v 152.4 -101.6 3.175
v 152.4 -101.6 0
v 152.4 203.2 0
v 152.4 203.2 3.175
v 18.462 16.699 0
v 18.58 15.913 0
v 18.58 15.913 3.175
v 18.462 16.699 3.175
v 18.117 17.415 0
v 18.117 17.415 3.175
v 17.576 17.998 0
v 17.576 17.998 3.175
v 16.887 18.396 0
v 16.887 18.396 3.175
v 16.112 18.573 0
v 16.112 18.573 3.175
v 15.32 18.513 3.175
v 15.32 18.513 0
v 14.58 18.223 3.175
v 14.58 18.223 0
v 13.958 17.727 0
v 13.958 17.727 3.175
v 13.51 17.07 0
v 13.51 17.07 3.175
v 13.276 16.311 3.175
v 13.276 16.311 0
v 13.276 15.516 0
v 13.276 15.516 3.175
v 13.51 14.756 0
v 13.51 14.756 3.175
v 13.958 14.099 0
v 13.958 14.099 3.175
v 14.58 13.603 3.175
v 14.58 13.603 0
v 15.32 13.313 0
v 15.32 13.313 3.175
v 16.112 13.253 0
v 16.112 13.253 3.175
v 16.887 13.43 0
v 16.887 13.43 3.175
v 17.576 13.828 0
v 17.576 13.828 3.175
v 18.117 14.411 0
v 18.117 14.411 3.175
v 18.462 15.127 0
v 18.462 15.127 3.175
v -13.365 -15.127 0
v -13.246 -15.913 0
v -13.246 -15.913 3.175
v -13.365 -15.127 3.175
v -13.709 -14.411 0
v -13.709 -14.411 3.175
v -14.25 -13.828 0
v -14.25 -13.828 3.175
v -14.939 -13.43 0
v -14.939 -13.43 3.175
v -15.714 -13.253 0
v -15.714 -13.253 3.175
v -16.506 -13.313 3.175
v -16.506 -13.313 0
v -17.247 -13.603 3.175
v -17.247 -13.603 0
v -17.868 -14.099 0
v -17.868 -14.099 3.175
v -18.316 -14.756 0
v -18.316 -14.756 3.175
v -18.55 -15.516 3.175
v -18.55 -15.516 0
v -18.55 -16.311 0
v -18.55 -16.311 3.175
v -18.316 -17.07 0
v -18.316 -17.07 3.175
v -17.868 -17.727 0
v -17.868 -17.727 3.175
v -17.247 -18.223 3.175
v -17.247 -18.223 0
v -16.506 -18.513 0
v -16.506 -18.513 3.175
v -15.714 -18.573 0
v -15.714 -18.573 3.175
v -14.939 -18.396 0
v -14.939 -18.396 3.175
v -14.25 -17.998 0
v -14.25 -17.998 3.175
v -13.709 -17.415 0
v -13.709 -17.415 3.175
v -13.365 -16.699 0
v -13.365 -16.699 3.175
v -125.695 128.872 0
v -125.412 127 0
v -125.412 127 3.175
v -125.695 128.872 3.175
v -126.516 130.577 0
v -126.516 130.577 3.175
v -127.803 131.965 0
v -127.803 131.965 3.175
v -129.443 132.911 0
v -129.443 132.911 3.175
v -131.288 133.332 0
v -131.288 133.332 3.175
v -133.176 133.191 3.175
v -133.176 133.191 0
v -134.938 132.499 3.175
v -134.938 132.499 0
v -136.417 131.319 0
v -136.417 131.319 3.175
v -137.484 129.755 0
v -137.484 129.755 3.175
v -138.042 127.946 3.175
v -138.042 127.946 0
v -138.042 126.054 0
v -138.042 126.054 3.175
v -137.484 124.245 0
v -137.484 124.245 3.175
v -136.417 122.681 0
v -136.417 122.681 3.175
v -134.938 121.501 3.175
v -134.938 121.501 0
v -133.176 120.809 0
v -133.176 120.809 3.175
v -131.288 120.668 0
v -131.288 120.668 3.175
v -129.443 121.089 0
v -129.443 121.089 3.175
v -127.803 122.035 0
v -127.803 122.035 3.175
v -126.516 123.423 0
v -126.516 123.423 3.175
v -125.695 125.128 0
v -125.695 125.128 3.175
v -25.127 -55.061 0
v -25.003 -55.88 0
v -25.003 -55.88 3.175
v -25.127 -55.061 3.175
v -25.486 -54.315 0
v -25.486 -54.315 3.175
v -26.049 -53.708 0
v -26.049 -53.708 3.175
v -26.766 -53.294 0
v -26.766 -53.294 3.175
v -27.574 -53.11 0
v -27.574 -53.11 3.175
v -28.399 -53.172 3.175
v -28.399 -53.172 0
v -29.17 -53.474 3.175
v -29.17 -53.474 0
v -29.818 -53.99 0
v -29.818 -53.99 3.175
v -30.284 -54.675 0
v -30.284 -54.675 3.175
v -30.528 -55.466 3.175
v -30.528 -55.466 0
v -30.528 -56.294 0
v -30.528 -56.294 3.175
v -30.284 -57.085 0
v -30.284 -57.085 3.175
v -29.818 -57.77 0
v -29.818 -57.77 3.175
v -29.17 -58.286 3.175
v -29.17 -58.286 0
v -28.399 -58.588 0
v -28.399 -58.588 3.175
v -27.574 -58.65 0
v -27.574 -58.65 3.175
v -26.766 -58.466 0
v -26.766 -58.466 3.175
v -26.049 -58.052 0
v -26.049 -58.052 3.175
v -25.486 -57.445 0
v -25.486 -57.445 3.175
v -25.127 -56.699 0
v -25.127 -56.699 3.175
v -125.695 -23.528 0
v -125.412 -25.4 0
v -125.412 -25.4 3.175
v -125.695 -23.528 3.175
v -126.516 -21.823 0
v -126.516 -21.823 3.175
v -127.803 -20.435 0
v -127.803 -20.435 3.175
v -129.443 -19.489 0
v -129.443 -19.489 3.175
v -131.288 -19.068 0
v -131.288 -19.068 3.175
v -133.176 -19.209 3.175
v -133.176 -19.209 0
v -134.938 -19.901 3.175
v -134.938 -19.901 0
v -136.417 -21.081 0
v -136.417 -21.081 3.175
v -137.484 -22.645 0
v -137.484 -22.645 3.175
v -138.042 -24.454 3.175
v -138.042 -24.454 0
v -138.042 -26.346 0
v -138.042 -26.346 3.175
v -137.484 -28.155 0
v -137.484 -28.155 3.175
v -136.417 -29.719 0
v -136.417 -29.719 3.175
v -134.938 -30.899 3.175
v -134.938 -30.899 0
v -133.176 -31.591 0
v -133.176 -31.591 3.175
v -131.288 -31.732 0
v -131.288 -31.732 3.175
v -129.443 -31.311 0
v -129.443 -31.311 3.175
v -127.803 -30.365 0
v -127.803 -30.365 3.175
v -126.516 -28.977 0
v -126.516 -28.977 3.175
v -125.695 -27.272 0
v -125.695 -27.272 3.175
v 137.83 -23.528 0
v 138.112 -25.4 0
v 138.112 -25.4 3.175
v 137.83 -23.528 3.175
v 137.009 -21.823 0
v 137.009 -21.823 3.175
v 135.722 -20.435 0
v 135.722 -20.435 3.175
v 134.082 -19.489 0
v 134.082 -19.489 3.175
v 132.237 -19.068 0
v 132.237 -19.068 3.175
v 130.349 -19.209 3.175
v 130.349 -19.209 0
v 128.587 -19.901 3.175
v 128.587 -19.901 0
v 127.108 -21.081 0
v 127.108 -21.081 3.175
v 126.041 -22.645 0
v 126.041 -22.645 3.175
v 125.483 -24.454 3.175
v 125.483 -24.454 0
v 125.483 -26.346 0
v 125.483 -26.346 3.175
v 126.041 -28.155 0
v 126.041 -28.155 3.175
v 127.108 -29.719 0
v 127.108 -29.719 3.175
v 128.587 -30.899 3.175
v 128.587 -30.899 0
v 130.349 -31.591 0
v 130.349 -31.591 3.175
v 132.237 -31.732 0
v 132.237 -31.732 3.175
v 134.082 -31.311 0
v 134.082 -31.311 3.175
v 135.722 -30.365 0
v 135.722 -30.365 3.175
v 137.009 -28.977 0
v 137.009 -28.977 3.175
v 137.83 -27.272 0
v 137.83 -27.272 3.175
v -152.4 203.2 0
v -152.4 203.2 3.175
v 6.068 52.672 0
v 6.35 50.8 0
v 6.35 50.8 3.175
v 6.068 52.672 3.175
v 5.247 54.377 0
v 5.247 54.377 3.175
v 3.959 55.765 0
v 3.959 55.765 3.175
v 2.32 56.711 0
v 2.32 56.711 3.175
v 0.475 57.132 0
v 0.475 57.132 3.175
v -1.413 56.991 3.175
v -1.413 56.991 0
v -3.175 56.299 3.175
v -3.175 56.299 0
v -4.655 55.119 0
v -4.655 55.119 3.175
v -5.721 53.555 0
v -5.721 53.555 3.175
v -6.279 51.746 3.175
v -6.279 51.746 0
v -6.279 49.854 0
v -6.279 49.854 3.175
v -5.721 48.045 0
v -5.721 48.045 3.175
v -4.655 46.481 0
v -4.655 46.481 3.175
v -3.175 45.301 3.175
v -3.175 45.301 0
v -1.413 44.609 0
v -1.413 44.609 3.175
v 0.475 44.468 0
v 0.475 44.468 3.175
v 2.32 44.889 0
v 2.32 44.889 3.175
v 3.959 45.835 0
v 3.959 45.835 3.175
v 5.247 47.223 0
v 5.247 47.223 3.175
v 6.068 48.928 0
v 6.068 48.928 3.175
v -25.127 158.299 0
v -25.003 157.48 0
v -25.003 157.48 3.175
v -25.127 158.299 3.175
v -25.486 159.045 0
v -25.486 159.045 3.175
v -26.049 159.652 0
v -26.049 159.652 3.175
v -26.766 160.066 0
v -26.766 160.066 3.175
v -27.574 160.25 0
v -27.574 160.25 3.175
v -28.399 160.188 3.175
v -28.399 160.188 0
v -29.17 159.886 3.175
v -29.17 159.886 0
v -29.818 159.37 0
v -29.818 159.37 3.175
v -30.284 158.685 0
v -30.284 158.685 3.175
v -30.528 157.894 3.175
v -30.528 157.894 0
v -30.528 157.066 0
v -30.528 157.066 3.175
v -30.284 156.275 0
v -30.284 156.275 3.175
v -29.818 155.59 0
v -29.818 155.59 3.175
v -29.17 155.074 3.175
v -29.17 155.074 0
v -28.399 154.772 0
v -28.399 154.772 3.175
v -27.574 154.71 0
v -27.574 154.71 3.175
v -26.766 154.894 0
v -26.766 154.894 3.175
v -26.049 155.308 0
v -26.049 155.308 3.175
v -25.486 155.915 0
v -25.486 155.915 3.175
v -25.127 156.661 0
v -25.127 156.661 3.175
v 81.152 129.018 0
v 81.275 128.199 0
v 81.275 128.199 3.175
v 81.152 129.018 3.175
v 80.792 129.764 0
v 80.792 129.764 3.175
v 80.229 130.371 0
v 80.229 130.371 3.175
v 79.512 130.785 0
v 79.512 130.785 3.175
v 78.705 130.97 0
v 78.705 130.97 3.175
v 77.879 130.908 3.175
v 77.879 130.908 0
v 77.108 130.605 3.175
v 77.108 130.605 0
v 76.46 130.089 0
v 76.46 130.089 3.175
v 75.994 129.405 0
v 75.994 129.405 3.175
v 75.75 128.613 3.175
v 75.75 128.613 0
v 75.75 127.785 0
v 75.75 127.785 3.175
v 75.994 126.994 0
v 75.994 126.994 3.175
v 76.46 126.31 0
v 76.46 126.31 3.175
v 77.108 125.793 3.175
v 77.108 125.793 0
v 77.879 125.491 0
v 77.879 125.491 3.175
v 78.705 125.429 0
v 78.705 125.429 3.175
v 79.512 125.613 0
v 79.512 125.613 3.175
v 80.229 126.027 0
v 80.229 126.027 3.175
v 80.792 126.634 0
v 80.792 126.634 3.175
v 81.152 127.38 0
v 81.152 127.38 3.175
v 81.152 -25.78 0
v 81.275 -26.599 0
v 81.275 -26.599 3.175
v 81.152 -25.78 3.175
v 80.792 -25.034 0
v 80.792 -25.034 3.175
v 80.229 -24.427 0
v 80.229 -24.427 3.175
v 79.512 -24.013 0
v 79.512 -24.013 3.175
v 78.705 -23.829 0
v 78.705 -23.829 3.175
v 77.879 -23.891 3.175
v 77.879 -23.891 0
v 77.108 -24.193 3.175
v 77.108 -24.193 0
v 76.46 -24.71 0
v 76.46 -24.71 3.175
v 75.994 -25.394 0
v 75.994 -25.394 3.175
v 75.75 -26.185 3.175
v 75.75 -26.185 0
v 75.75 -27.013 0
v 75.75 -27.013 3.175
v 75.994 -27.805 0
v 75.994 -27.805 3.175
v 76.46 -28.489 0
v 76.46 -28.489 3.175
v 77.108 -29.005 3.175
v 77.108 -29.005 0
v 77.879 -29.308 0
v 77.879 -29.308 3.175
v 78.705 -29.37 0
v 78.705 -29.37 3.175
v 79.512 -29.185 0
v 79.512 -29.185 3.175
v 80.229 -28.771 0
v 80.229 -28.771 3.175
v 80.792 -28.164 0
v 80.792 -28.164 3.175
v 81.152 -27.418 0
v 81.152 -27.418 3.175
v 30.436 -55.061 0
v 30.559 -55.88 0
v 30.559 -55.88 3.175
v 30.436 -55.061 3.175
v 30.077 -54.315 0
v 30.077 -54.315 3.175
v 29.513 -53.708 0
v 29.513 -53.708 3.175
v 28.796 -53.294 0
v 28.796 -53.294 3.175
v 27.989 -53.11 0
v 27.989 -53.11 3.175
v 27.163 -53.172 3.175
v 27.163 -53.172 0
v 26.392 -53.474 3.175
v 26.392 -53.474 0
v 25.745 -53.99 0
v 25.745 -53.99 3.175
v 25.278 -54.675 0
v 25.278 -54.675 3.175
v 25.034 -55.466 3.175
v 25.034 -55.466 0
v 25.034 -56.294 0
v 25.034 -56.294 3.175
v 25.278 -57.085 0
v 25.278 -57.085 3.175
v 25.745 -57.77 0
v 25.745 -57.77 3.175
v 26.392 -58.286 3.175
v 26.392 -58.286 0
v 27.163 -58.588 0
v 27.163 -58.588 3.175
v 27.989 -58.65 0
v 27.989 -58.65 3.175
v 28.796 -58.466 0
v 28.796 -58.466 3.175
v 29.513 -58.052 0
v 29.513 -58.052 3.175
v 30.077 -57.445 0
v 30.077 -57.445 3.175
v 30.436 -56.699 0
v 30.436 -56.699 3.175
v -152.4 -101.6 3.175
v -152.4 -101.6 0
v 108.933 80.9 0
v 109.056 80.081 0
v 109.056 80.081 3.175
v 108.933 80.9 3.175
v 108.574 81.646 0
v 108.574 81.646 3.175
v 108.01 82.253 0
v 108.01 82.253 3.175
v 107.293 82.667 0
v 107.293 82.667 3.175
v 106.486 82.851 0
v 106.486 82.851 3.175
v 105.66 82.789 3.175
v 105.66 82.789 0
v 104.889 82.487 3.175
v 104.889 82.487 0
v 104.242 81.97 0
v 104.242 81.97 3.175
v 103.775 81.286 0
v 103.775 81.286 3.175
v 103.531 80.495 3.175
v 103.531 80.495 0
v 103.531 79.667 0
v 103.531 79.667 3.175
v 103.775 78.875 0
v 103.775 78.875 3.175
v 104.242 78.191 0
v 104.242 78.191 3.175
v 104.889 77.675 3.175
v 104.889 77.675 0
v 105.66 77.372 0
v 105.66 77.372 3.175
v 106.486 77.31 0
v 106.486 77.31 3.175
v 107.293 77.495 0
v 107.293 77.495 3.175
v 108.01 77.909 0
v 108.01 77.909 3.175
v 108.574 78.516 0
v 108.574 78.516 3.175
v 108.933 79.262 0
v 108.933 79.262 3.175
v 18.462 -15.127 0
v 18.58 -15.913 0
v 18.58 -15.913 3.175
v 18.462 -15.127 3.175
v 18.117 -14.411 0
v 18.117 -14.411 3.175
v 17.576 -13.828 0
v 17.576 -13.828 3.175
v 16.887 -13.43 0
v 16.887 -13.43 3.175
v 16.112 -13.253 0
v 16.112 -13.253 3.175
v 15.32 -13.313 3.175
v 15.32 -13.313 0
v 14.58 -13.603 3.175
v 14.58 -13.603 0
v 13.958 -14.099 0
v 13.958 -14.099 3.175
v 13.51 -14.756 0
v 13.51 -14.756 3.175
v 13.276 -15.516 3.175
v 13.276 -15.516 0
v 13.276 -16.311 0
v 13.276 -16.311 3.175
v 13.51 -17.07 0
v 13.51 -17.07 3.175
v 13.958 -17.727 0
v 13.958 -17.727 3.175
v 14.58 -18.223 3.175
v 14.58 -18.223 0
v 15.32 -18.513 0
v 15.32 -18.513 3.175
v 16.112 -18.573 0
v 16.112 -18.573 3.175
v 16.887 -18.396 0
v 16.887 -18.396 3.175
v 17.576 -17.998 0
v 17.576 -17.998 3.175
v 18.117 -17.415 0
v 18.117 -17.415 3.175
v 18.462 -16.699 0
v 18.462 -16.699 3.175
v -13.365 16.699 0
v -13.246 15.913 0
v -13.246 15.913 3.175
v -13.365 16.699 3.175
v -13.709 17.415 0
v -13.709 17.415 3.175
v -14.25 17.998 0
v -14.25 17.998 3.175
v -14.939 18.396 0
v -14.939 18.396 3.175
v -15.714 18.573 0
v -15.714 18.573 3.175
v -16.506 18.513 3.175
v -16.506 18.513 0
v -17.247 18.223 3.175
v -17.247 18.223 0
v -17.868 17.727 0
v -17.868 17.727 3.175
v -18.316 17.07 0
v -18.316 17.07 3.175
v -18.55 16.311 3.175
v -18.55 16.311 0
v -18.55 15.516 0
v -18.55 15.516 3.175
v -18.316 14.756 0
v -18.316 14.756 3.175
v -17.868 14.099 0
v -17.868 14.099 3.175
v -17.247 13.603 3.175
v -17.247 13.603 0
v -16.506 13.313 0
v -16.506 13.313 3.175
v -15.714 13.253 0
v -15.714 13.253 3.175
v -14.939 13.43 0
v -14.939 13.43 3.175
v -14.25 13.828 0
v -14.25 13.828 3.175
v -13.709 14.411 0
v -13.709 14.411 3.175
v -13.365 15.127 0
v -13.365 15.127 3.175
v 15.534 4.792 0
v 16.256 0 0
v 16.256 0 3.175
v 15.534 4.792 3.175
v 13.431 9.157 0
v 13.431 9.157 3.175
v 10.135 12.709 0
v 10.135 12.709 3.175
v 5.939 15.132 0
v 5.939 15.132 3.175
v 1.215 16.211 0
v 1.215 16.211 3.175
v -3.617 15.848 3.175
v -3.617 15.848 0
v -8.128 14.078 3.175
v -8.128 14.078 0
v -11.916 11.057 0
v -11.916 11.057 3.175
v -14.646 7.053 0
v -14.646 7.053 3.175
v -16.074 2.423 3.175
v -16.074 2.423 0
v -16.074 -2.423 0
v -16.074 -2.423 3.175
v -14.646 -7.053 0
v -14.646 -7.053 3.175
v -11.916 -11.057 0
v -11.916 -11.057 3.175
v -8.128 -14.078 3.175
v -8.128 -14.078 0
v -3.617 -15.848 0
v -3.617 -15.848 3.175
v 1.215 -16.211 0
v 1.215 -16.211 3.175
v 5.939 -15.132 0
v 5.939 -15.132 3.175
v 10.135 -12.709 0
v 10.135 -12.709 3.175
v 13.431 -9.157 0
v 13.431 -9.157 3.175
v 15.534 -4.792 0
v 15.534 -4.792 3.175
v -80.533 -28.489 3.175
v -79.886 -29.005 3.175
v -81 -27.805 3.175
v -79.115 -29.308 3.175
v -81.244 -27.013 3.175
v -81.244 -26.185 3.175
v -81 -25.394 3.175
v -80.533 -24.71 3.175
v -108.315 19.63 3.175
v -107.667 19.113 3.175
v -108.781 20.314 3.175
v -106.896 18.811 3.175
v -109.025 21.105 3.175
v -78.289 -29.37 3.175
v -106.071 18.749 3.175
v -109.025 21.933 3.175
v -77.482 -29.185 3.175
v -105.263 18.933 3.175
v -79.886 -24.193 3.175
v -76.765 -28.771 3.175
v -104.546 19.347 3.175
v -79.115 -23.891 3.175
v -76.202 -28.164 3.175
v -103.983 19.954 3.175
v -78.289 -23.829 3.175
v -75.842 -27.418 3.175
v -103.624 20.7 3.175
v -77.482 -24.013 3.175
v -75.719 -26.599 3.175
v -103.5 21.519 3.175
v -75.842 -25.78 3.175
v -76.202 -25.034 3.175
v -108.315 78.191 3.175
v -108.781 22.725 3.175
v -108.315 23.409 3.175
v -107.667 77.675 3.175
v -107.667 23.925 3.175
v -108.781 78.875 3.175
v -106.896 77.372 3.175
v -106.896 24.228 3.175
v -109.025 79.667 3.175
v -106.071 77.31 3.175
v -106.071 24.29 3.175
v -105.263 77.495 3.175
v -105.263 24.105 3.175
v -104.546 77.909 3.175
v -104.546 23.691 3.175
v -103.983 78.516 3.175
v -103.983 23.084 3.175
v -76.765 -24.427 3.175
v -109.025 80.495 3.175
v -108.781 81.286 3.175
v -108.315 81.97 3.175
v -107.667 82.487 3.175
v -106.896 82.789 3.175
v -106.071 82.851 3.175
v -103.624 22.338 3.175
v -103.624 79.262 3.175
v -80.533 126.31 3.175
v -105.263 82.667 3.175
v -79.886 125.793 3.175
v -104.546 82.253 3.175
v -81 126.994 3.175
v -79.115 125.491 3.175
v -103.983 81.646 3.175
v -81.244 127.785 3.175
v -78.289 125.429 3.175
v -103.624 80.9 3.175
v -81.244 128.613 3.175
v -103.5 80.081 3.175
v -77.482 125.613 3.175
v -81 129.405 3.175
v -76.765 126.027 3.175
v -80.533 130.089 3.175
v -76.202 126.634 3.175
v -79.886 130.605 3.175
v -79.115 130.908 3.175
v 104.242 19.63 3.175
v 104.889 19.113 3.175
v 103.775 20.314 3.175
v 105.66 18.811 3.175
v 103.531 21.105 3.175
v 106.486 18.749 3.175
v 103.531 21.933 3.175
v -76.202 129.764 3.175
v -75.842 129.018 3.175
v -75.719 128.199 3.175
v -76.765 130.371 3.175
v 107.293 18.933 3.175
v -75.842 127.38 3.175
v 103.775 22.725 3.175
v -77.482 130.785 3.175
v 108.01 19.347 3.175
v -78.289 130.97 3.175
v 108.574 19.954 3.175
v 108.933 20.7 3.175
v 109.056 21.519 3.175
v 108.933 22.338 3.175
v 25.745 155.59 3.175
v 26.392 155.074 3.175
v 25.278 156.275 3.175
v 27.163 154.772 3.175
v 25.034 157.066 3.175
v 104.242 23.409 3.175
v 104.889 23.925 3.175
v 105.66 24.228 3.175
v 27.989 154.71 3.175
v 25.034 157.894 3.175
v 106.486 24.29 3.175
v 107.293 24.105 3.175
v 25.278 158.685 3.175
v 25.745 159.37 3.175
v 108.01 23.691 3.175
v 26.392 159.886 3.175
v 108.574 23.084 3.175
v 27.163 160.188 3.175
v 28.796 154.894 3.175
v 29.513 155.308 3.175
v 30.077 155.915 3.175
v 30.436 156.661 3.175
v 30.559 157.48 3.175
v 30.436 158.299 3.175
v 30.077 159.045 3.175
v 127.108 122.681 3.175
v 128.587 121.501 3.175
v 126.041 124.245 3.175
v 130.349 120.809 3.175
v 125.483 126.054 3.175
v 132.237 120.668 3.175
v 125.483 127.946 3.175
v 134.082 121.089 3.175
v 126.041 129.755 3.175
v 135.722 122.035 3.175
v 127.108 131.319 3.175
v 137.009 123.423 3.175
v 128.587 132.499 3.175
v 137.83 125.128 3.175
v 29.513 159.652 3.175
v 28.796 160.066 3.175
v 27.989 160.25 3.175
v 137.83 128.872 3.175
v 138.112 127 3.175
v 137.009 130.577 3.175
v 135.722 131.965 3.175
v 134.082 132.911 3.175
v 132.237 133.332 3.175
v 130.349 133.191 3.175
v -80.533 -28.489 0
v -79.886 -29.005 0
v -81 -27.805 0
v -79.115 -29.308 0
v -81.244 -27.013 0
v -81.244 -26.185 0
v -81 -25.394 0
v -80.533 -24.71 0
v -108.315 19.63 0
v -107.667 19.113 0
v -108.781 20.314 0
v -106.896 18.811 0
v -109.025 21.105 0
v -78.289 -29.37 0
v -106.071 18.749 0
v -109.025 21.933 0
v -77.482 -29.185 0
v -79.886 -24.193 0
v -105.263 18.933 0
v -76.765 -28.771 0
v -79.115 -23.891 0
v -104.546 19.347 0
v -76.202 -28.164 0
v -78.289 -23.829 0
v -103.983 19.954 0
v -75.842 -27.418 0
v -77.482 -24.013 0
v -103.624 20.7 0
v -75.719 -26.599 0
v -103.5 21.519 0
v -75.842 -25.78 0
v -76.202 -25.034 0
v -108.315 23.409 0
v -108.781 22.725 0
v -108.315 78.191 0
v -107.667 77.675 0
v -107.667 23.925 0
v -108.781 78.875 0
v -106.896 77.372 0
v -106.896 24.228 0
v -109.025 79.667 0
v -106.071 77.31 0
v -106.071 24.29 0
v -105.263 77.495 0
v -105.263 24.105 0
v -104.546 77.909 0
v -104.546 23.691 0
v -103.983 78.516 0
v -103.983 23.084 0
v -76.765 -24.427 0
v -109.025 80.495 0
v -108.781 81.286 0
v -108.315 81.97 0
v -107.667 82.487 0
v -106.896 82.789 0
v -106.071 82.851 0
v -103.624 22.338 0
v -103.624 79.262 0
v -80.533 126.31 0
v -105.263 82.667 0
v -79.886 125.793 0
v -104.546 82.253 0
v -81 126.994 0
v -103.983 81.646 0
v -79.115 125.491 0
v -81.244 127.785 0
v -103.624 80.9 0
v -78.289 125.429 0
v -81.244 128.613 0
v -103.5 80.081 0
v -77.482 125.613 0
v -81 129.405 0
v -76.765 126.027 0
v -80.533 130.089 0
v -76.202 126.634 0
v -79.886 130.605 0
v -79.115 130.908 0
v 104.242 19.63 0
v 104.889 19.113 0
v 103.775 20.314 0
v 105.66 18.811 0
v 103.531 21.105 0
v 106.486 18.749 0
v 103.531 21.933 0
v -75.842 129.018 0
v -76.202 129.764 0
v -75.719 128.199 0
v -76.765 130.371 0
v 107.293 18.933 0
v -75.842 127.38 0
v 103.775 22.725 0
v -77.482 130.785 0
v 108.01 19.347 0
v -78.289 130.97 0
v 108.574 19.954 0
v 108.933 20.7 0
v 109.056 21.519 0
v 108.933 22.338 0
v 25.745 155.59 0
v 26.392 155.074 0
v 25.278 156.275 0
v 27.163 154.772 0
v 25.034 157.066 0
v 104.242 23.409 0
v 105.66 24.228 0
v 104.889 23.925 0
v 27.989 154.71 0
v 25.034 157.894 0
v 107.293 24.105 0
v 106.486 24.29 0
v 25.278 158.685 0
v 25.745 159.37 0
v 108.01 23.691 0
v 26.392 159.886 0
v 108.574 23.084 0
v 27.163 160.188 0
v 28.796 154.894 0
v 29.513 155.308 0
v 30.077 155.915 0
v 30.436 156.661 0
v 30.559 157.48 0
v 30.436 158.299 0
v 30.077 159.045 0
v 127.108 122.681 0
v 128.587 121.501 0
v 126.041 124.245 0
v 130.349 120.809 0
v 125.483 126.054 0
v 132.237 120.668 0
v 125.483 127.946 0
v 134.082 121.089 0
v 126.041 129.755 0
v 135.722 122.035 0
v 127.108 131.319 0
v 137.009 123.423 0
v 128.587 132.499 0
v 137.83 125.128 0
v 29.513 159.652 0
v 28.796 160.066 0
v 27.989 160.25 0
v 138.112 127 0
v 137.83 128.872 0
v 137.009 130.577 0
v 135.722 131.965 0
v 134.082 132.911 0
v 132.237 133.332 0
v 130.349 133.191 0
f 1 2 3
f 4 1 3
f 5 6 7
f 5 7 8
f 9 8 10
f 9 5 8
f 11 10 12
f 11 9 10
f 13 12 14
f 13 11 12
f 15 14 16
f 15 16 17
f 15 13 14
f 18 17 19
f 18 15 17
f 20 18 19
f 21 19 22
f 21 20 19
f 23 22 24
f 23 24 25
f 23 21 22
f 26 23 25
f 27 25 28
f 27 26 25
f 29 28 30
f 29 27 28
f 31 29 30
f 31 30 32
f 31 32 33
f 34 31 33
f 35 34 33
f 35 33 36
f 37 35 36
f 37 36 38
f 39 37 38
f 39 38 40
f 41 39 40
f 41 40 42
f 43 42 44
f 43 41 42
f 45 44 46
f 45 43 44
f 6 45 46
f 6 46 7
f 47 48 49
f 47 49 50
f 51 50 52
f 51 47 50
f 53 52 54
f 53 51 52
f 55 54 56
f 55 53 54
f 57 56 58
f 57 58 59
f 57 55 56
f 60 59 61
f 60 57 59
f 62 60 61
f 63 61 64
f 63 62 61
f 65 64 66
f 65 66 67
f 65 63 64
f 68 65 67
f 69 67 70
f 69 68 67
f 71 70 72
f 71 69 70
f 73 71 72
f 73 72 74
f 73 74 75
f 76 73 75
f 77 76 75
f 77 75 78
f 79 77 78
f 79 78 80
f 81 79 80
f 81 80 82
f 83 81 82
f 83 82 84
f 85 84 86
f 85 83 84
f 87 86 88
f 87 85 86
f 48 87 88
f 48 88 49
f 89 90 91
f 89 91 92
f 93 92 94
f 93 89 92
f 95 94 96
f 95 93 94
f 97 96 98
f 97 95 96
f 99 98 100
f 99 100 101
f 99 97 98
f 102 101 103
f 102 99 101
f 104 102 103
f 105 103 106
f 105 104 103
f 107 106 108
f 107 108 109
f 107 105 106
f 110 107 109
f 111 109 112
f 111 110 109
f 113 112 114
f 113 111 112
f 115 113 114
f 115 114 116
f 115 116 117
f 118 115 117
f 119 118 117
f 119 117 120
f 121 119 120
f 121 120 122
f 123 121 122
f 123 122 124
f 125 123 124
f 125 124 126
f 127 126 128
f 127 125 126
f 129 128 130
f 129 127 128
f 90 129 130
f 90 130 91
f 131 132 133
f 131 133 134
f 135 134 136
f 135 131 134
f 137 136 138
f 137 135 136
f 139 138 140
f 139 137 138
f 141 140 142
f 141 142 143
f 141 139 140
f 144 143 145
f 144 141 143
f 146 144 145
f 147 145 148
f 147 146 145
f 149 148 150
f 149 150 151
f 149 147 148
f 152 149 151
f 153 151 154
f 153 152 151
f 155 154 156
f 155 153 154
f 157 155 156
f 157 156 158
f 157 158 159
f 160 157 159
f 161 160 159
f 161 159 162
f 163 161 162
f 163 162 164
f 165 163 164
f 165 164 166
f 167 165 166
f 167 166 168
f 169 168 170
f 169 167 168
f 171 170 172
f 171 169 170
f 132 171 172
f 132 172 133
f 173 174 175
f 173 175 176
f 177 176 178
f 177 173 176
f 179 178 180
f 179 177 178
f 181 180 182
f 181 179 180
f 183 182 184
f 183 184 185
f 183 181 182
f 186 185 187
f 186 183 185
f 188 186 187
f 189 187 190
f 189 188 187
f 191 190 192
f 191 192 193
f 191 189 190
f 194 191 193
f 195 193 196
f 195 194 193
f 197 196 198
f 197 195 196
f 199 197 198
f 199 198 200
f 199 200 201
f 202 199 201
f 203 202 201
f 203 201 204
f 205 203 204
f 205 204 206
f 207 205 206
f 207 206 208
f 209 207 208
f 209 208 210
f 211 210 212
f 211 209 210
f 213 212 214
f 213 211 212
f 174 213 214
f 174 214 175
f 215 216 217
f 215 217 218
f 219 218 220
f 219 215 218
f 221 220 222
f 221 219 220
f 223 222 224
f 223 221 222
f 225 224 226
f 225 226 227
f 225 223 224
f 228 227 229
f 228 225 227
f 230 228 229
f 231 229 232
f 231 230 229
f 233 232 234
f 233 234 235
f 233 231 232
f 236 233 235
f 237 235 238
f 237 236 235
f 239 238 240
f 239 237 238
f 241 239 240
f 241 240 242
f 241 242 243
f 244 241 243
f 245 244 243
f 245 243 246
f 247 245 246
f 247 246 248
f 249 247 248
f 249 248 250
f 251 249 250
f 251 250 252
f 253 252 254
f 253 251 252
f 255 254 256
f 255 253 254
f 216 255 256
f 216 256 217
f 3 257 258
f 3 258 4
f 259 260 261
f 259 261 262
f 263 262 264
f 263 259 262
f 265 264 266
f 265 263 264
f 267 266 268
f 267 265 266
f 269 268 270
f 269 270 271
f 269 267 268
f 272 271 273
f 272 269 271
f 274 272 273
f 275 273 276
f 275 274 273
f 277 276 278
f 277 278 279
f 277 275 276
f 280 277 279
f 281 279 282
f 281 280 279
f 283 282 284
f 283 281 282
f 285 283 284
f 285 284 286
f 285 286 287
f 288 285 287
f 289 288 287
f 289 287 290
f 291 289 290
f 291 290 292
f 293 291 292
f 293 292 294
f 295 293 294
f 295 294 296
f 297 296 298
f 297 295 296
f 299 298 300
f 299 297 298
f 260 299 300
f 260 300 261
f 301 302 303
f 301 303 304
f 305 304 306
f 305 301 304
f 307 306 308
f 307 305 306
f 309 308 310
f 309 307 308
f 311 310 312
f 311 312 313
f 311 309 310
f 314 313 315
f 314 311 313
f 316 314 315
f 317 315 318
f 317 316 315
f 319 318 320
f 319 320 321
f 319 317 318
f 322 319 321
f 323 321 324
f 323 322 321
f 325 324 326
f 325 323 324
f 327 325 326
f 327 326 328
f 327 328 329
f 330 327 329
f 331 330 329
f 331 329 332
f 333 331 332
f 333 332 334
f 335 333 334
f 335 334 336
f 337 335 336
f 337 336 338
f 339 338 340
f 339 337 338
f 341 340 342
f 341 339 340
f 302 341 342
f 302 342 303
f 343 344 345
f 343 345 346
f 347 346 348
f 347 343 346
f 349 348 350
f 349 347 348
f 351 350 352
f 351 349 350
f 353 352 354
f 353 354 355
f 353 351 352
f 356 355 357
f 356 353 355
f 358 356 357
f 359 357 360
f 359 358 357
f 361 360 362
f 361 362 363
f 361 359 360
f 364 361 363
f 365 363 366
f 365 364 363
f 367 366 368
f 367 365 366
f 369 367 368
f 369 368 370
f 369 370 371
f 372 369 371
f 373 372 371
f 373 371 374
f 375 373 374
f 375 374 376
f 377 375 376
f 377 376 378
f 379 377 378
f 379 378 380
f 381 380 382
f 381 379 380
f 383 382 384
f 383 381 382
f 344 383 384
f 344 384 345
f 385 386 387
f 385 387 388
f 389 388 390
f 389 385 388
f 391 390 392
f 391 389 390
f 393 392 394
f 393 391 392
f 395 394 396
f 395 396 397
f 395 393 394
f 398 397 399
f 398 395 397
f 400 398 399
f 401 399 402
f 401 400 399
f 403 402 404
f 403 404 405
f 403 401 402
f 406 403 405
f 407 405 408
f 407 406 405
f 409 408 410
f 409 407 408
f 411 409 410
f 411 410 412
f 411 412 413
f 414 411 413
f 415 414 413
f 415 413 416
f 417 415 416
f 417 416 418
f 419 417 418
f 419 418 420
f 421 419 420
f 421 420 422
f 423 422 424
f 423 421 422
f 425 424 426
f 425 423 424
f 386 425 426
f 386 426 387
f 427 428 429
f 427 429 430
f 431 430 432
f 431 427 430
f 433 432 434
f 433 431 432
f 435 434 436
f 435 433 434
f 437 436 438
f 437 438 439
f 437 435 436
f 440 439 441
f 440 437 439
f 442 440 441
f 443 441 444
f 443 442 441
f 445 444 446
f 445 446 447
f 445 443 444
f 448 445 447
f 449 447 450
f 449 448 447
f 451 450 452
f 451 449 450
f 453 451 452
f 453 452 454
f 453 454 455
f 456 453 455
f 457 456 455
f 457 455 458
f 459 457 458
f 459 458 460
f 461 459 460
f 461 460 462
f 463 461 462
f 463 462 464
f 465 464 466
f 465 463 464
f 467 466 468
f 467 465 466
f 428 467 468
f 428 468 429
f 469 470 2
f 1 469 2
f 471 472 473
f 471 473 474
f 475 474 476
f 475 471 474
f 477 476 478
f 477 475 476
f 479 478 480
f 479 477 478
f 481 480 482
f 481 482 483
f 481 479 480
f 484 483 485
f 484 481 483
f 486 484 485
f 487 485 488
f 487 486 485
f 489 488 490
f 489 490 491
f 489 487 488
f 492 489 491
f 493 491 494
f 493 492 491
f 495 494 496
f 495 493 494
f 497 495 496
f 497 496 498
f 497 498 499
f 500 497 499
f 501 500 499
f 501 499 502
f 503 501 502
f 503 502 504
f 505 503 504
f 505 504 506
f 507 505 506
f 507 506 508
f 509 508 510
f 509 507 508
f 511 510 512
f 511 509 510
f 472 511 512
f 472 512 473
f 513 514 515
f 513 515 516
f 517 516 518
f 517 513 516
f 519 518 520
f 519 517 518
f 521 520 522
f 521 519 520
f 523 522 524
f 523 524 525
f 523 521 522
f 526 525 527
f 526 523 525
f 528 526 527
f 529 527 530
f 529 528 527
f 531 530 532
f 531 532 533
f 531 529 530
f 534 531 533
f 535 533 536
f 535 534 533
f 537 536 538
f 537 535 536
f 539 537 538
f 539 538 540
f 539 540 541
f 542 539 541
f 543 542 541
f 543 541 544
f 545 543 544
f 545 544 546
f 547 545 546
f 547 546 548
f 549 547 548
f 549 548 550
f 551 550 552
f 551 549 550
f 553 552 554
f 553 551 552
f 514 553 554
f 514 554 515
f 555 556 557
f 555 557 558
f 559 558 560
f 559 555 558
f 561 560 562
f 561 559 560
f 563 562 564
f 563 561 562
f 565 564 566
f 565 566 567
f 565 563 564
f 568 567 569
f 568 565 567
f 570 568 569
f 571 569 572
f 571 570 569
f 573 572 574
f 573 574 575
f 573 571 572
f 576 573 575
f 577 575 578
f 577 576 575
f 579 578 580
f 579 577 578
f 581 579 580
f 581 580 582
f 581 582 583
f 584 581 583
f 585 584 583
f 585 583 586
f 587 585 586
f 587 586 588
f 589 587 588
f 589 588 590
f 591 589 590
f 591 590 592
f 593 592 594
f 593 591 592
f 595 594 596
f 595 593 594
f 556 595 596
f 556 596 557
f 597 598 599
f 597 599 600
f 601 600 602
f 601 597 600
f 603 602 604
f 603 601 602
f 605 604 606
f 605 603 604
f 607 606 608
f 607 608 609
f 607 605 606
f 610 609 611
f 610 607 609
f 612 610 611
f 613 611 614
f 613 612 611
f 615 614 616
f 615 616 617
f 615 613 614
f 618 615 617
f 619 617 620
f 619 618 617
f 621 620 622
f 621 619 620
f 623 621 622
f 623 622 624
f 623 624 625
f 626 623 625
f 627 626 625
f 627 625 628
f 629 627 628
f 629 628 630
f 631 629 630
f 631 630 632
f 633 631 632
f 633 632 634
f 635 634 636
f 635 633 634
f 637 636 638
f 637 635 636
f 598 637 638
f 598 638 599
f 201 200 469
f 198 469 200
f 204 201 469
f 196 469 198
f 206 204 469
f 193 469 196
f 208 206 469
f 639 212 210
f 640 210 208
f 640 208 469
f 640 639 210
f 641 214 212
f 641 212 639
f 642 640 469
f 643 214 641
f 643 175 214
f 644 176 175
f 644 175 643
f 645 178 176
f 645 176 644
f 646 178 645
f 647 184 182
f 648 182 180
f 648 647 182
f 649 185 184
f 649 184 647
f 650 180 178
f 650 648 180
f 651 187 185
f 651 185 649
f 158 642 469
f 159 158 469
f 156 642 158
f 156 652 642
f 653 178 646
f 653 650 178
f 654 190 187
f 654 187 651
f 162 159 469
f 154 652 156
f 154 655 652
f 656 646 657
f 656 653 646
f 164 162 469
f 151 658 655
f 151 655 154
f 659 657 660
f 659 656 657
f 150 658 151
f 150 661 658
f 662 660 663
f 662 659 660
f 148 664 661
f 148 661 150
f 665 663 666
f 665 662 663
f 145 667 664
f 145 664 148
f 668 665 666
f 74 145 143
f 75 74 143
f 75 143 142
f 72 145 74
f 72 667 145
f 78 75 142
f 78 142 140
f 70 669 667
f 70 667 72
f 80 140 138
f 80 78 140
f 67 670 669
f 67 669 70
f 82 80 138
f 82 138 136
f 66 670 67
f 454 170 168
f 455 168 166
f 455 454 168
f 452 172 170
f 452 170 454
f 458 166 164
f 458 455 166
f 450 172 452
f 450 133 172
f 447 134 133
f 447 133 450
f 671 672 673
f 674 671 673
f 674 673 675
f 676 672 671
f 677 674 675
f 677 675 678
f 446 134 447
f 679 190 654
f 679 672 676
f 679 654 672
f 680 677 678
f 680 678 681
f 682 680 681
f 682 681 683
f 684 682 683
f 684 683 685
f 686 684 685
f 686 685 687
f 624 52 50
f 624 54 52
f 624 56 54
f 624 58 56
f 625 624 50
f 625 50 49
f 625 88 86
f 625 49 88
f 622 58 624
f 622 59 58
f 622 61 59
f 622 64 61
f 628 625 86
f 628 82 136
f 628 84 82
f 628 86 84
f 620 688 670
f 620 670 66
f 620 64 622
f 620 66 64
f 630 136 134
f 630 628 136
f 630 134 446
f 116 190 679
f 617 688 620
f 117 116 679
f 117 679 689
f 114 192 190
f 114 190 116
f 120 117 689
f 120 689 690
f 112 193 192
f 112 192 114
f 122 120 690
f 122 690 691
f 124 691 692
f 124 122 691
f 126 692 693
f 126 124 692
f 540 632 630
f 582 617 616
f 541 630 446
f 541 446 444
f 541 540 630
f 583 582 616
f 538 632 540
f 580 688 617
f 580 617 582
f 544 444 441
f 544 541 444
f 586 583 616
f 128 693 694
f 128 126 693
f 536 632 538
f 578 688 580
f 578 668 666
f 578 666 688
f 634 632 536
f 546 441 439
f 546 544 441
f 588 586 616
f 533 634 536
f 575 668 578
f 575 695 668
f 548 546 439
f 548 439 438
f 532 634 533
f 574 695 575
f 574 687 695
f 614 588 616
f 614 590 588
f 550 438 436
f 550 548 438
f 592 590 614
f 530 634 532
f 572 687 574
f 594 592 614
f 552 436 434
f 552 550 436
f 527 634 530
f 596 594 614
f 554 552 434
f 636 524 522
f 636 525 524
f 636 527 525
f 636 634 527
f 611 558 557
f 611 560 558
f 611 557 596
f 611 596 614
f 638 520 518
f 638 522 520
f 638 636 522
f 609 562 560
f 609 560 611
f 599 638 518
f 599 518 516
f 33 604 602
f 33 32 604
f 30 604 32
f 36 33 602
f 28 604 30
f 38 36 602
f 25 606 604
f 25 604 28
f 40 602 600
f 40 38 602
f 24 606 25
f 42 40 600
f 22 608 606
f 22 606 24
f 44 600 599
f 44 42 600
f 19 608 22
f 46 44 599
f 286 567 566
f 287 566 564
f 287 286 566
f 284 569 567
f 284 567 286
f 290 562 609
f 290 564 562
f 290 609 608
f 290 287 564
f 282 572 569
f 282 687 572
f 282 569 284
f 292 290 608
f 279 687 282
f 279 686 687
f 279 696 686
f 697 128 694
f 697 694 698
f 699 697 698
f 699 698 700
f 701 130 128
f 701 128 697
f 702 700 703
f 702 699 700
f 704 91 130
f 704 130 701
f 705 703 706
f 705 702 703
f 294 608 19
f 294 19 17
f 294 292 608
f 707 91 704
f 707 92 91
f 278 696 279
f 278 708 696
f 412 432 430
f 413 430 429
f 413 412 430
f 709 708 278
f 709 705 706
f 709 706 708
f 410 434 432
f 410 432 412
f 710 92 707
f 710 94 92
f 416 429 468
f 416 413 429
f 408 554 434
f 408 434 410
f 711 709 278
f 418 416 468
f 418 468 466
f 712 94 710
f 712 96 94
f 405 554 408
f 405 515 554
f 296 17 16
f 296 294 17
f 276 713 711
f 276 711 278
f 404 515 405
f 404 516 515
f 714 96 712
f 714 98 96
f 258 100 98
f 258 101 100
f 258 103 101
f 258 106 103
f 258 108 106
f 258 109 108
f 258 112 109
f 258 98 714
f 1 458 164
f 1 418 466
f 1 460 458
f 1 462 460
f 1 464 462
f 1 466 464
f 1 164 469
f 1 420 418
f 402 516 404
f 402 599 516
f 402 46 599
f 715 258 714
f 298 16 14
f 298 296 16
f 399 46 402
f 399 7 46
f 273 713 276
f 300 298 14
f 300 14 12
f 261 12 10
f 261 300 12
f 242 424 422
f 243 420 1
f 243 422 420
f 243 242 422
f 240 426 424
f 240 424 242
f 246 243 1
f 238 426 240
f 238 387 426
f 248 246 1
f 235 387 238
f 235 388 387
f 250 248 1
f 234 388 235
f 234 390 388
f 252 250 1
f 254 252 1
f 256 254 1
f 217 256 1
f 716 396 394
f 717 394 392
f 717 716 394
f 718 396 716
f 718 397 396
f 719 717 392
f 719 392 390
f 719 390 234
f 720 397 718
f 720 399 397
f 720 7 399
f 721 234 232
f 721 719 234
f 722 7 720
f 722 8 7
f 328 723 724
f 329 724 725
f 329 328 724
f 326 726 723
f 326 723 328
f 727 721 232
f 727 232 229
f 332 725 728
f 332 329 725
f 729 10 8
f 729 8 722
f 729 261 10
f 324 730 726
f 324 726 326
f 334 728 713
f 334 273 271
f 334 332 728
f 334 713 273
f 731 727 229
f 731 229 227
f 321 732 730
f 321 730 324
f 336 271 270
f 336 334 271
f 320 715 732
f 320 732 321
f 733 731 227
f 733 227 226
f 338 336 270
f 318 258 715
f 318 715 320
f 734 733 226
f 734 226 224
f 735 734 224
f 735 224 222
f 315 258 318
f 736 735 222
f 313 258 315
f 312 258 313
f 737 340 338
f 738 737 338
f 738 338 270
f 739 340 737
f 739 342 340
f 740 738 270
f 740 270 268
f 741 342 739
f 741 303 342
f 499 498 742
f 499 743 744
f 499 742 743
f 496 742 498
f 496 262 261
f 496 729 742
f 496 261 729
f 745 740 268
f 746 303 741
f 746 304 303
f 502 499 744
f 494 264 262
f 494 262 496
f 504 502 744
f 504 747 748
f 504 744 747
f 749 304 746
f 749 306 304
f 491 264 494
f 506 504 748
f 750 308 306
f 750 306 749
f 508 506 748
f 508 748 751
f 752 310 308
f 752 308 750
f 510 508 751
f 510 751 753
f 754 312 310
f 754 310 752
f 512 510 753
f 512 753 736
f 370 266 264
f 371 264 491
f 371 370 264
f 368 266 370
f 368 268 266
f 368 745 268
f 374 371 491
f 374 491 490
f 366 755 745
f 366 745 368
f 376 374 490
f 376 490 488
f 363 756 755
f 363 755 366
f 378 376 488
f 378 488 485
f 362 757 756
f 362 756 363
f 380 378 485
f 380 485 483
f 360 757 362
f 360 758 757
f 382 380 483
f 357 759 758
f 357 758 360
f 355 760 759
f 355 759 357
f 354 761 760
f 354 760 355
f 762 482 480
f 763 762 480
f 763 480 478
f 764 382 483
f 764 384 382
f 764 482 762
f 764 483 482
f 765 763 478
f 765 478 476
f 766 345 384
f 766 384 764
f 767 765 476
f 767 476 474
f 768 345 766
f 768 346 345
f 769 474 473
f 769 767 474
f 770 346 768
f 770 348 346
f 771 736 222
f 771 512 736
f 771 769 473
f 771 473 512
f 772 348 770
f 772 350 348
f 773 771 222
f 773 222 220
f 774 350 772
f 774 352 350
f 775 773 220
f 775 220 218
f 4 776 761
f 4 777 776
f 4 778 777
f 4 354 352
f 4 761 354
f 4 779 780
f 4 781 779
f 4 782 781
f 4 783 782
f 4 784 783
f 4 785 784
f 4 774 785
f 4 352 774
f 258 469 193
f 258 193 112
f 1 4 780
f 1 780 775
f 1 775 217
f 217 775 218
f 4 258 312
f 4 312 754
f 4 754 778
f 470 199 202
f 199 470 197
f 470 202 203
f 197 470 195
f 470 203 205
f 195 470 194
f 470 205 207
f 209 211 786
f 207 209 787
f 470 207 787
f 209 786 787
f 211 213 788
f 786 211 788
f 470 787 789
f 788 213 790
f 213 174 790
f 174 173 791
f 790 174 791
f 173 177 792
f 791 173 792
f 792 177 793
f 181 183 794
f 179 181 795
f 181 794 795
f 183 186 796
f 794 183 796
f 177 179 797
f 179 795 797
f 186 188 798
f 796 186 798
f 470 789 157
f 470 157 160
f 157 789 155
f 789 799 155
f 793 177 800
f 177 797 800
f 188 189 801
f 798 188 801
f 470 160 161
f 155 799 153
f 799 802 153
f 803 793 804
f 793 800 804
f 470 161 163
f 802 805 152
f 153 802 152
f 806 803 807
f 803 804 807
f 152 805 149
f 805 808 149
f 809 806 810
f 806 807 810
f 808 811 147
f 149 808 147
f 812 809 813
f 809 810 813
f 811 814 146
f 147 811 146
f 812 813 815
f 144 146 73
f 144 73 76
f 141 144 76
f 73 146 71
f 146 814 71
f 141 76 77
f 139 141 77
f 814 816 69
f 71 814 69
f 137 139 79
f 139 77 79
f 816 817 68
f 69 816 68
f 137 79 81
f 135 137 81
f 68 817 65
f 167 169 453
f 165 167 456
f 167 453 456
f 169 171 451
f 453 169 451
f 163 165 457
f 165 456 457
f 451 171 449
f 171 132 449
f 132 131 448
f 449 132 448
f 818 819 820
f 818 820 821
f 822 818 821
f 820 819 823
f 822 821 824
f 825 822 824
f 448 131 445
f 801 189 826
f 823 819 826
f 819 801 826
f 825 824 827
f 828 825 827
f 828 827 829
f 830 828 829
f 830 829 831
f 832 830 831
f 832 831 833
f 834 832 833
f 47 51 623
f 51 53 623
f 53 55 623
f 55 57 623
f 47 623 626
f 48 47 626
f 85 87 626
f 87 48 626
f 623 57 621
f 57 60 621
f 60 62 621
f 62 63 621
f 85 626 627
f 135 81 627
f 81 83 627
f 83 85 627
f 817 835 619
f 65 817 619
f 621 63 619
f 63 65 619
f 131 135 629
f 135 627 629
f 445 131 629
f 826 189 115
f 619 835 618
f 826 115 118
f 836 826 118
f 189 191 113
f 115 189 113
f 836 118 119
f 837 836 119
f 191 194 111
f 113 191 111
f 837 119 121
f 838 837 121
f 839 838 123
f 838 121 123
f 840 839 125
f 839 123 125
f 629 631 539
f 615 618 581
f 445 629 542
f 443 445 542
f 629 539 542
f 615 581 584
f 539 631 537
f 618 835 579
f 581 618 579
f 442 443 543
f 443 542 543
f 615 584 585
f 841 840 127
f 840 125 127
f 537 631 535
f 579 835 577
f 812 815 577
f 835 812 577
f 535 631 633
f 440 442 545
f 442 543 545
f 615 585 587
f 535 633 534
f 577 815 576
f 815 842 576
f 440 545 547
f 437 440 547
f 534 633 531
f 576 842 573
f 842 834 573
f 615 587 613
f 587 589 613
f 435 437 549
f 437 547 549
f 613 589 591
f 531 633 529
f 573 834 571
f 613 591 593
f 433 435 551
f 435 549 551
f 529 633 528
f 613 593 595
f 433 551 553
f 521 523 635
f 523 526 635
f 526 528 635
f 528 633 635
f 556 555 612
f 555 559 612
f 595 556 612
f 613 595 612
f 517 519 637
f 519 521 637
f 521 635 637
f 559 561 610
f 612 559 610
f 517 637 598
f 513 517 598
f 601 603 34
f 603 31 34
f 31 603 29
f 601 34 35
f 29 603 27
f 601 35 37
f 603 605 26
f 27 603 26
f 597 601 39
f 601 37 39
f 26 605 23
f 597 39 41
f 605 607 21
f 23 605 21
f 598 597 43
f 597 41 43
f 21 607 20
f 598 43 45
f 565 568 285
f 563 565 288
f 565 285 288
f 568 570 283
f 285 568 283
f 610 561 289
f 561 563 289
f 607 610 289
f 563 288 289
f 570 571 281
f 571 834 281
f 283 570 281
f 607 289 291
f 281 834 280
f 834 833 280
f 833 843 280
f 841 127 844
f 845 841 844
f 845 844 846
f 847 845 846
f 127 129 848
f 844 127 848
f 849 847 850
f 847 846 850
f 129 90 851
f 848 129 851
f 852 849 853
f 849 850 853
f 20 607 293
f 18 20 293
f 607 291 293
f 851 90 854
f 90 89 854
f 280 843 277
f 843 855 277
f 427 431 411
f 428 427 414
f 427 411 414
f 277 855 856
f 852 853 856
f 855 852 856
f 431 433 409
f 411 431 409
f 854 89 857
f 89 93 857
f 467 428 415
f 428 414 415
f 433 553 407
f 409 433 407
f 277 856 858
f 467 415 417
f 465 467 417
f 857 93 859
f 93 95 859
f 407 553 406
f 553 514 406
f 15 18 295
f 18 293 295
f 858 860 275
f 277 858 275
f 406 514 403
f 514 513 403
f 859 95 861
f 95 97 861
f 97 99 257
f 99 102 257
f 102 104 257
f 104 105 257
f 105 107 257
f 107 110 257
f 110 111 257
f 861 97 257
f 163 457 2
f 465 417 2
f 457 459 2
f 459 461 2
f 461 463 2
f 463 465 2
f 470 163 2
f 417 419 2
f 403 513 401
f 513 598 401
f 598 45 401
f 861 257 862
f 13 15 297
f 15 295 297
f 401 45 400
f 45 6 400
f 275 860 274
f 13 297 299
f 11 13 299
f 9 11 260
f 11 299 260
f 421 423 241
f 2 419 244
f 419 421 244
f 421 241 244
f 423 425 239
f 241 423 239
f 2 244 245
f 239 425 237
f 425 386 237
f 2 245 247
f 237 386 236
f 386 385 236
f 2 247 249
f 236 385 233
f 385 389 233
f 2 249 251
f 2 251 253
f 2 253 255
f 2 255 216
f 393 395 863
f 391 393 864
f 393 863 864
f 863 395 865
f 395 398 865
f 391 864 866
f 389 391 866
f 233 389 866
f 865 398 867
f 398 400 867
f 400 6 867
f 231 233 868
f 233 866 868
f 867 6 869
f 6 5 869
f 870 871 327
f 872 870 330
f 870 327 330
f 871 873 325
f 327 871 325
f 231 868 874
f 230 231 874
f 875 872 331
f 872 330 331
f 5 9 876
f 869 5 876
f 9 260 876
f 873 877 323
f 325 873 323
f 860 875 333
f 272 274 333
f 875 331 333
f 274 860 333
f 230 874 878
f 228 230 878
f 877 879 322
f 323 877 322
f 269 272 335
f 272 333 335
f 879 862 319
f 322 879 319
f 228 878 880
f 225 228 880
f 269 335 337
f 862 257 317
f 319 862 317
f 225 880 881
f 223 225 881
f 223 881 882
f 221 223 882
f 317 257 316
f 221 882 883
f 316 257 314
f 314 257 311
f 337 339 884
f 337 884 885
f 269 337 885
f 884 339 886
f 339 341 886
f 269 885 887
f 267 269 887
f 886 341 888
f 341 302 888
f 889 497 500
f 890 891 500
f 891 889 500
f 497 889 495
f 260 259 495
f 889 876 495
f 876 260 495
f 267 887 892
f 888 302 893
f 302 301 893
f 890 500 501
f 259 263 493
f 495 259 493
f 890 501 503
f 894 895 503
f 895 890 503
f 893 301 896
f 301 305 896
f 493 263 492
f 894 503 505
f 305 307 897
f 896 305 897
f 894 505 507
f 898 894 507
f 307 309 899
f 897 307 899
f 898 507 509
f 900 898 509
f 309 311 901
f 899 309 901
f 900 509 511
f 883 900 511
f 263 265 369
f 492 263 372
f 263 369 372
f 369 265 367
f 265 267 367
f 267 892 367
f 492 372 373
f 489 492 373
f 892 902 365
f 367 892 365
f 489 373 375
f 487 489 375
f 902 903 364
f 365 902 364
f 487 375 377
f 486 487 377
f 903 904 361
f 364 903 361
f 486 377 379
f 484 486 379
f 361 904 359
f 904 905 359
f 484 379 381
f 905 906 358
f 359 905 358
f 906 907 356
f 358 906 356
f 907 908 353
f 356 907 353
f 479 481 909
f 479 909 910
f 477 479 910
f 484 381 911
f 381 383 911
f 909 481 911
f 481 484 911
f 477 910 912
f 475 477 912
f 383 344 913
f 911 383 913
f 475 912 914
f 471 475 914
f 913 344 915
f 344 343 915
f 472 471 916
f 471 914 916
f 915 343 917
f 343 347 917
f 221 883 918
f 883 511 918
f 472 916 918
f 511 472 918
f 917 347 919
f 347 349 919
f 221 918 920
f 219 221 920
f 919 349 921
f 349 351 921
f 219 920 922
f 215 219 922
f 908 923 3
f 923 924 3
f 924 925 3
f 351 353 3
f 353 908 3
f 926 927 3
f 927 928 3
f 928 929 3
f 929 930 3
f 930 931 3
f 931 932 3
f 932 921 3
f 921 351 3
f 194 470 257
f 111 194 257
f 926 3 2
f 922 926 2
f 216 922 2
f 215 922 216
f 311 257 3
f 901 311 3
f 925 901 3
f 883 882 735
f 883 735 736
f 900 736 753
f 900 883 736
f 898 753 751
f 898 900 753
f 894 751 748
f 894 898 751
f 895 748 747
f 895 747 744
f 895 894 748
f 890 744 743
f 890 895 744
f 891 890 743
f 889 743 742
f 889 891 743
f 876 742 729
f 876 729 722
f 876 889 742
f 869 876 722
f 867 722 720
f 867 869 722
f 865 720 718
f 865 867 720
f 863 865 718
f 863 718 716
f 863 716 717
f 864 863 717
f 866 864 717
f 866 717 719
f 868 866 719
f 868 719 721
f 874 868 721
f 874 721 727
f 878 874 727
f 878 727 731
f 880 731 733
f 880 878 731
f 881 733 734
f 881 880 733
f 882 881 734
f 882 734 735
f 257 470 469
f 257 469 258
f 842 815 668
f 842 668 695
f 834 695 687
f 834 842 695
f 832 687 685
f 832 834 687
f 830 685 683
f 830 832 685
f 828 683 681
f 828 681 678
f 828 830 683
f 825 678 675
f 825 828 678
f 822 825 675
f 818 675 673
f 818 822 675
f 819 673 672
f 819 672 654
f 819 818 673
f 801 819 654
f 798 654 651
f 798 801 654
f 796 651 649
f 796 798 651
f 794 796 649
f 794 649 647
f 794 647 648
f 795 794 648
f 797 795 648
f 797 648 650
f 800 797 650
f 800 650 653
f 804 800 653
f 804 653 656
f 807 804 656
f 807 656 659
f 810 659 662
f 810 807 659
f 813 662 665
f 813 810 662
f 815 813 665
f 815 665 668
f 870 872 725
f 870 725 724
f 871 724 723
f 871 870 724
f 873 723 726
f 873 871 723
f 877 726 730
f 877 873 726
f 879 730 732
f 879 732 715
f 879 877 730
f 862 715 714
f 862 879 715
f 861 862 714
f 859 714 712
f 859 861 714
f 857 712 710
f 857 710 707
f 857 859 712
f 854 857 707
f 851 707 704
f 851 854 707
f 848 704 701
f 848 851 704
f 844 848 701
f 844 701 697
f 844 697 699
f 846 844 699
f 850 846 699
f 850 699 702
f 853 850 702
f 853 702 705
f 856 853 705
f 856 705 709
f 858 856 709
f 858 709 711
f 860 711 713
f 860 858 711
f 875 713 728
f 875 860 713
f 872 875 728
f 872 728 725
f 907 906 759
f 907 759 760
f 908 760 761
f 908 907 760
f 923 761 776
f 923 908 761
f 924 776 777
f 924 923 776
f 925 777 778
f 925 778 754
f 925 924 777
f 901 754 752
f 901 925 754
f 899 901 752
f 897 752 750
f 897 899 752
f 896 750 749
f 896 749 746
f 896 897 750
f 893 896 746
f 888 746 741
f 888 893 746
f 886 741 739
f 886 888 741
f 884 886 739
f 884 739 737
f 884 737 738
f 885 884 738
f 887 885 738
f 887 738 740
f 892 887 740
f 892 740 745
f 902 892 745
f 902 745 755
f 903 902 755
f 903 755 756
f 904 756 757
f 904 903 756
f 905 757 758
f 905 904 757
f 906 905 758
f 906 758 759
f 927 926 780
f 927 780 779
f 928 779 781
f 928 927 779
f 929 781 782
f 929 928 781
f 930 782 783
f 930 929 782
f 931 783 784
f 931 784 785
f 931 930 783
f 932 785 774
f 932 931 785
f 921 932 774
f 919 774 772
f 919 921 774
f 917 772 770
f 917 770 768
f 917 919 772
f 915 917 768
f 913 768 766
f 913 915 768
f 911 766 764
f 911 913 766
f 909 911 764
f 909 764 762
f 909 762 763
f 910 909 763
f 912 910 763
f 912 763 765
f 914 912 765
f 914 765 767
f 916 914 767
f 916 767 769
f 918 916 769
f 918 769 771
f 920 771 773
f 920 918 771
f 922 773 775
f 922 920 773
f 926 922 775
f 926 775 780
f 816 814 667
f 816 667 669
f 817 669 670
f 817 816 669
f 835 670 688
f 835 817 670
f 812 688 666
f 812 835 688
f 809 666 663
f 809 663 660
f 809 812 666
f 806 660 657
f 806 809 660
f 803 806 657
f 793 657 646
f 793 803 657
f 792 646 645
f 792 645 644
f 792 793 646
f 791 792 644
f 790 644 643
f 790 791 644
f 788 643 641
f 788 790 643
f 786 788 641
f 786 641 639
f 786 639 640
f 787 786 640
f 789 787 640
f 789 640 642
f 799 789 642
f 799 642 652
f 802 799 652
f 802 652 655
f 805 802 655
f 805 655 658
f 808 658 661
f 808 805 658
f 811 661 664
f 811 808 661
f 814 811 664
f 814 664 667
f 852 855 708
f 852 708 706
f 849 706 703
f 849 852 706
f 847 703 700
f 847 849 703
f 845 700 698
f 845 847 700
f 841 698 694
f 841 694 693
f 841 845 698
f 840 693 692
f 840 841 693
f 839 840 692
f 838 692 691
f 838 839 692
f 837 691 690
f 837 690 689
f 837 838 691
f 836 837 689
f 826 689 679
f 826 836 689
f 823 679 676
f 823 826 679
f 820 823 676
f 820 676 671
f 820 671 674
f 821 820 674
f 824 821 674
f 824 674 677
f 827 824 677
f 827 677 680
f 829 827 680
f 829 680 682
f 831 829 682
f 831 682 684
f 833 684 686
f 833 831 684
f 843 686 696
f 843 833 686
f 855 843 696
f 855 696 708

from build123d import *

# Parameters (mm, degrees)
F0_W     = 304.8
F0_H     = 304.8
F0_R     = 2.778125
F0_R_2   = 6.35
F0_R_3   = 2.667
F0_R_4   = 16.256
F1_DEPTH = 3.175


with BuildPart() as f1:
    # F0 (on Top) → F1 (new body)
    with BuildSketch(Plane.XY):
        with Locations((0, 50.8)):
            Rectangle(F0_W, F0_H)
        with Locations((-78.496965, -26.599268)):
            Circle(F0_R, mode=Mode.SUBTRACT)
        with Locations((-27.78125, -55.88)):
            Circle(F0_R, mode=Mode.SUBTRACT)
        with Locations((-131.7625, -25.4)):
            Circle(F0_R_2, mode=Mode.SUBTRACT)
        with Locations((-106.278215, 21.519268)):
            Circle(F0_R, mode=Mode.SUBTRACT)
        with Locations((-15.913014, -15.913014)):
            Circle(F0_R_3, mode=Mode.SUBTRACT)
        with Locations((-15.913014, 15.913014)):
            Circle(F0_R_3, mode=Mode.SUBTRACT)
        with Locations((27.78125, -55.88)):
            Circle(F0_R, mode=Mode.SUBTRACT)
        with Locations((78.496965, -26.599268)):
            Circle(F0_R, mode=Mode.SUBTRACT)
        with Locations((15.913014, -15.913014)):
            Circle(F0_R_3, mode=Mode.SUBTRACT)
        Circle(F0_R_4, mode=Mode.SUBTRACT)
        with Locations((15.913014, 15.913014)):
            Circle(F0_R_3, mode=Mode.SUBTRACT)
        with Locations((131.7625, -25.4)):
            Circle(F0_R_2, mode=Mode.SUBTRACT)
        with Locations((106.278215, 21.519268)):
            Circle(F0_R, mode=Mode.SUBTRACT)
        with Locations((-106.278215, 80.080732)):
            Circle(F0_R, mode=Mode.SUBTRACT)
        with Locations((-131.7625, 127)):
            Circle(F0_R_2, mode=Mode.SUBTRACT)
        with Locations((-78.496965, 128.199268)):
            Circle(F0_R, mode=Mode.SUBTRACT)
        with Locations((-27.78125, 157.48)):
            Circle(F0_R, mode=Mode.SUBTRACT)
        with Locations((0, 50.8)):
            Circle(F0_R_2, mode=Mode.SUBTRACT)
        with Locations((106.278215, 80.080732)):
            Circle(F0_R, mode=Mode.SUBTRACT)
        with Locations((27.78125, 157.48)):
            Circle(F0_R, mode=Mode.SUBTRACT)
        with Locations((78.496965, 128.199268)):
            Circle(F0_R, mode=Mode.SUBTRACT)
        with Locations((131.7625, 127)):
            Circle(F0_R_2, mode=Mode.SUBTRACT)
    extrude(amount=F1_DEPTH)


solid = f1.part
